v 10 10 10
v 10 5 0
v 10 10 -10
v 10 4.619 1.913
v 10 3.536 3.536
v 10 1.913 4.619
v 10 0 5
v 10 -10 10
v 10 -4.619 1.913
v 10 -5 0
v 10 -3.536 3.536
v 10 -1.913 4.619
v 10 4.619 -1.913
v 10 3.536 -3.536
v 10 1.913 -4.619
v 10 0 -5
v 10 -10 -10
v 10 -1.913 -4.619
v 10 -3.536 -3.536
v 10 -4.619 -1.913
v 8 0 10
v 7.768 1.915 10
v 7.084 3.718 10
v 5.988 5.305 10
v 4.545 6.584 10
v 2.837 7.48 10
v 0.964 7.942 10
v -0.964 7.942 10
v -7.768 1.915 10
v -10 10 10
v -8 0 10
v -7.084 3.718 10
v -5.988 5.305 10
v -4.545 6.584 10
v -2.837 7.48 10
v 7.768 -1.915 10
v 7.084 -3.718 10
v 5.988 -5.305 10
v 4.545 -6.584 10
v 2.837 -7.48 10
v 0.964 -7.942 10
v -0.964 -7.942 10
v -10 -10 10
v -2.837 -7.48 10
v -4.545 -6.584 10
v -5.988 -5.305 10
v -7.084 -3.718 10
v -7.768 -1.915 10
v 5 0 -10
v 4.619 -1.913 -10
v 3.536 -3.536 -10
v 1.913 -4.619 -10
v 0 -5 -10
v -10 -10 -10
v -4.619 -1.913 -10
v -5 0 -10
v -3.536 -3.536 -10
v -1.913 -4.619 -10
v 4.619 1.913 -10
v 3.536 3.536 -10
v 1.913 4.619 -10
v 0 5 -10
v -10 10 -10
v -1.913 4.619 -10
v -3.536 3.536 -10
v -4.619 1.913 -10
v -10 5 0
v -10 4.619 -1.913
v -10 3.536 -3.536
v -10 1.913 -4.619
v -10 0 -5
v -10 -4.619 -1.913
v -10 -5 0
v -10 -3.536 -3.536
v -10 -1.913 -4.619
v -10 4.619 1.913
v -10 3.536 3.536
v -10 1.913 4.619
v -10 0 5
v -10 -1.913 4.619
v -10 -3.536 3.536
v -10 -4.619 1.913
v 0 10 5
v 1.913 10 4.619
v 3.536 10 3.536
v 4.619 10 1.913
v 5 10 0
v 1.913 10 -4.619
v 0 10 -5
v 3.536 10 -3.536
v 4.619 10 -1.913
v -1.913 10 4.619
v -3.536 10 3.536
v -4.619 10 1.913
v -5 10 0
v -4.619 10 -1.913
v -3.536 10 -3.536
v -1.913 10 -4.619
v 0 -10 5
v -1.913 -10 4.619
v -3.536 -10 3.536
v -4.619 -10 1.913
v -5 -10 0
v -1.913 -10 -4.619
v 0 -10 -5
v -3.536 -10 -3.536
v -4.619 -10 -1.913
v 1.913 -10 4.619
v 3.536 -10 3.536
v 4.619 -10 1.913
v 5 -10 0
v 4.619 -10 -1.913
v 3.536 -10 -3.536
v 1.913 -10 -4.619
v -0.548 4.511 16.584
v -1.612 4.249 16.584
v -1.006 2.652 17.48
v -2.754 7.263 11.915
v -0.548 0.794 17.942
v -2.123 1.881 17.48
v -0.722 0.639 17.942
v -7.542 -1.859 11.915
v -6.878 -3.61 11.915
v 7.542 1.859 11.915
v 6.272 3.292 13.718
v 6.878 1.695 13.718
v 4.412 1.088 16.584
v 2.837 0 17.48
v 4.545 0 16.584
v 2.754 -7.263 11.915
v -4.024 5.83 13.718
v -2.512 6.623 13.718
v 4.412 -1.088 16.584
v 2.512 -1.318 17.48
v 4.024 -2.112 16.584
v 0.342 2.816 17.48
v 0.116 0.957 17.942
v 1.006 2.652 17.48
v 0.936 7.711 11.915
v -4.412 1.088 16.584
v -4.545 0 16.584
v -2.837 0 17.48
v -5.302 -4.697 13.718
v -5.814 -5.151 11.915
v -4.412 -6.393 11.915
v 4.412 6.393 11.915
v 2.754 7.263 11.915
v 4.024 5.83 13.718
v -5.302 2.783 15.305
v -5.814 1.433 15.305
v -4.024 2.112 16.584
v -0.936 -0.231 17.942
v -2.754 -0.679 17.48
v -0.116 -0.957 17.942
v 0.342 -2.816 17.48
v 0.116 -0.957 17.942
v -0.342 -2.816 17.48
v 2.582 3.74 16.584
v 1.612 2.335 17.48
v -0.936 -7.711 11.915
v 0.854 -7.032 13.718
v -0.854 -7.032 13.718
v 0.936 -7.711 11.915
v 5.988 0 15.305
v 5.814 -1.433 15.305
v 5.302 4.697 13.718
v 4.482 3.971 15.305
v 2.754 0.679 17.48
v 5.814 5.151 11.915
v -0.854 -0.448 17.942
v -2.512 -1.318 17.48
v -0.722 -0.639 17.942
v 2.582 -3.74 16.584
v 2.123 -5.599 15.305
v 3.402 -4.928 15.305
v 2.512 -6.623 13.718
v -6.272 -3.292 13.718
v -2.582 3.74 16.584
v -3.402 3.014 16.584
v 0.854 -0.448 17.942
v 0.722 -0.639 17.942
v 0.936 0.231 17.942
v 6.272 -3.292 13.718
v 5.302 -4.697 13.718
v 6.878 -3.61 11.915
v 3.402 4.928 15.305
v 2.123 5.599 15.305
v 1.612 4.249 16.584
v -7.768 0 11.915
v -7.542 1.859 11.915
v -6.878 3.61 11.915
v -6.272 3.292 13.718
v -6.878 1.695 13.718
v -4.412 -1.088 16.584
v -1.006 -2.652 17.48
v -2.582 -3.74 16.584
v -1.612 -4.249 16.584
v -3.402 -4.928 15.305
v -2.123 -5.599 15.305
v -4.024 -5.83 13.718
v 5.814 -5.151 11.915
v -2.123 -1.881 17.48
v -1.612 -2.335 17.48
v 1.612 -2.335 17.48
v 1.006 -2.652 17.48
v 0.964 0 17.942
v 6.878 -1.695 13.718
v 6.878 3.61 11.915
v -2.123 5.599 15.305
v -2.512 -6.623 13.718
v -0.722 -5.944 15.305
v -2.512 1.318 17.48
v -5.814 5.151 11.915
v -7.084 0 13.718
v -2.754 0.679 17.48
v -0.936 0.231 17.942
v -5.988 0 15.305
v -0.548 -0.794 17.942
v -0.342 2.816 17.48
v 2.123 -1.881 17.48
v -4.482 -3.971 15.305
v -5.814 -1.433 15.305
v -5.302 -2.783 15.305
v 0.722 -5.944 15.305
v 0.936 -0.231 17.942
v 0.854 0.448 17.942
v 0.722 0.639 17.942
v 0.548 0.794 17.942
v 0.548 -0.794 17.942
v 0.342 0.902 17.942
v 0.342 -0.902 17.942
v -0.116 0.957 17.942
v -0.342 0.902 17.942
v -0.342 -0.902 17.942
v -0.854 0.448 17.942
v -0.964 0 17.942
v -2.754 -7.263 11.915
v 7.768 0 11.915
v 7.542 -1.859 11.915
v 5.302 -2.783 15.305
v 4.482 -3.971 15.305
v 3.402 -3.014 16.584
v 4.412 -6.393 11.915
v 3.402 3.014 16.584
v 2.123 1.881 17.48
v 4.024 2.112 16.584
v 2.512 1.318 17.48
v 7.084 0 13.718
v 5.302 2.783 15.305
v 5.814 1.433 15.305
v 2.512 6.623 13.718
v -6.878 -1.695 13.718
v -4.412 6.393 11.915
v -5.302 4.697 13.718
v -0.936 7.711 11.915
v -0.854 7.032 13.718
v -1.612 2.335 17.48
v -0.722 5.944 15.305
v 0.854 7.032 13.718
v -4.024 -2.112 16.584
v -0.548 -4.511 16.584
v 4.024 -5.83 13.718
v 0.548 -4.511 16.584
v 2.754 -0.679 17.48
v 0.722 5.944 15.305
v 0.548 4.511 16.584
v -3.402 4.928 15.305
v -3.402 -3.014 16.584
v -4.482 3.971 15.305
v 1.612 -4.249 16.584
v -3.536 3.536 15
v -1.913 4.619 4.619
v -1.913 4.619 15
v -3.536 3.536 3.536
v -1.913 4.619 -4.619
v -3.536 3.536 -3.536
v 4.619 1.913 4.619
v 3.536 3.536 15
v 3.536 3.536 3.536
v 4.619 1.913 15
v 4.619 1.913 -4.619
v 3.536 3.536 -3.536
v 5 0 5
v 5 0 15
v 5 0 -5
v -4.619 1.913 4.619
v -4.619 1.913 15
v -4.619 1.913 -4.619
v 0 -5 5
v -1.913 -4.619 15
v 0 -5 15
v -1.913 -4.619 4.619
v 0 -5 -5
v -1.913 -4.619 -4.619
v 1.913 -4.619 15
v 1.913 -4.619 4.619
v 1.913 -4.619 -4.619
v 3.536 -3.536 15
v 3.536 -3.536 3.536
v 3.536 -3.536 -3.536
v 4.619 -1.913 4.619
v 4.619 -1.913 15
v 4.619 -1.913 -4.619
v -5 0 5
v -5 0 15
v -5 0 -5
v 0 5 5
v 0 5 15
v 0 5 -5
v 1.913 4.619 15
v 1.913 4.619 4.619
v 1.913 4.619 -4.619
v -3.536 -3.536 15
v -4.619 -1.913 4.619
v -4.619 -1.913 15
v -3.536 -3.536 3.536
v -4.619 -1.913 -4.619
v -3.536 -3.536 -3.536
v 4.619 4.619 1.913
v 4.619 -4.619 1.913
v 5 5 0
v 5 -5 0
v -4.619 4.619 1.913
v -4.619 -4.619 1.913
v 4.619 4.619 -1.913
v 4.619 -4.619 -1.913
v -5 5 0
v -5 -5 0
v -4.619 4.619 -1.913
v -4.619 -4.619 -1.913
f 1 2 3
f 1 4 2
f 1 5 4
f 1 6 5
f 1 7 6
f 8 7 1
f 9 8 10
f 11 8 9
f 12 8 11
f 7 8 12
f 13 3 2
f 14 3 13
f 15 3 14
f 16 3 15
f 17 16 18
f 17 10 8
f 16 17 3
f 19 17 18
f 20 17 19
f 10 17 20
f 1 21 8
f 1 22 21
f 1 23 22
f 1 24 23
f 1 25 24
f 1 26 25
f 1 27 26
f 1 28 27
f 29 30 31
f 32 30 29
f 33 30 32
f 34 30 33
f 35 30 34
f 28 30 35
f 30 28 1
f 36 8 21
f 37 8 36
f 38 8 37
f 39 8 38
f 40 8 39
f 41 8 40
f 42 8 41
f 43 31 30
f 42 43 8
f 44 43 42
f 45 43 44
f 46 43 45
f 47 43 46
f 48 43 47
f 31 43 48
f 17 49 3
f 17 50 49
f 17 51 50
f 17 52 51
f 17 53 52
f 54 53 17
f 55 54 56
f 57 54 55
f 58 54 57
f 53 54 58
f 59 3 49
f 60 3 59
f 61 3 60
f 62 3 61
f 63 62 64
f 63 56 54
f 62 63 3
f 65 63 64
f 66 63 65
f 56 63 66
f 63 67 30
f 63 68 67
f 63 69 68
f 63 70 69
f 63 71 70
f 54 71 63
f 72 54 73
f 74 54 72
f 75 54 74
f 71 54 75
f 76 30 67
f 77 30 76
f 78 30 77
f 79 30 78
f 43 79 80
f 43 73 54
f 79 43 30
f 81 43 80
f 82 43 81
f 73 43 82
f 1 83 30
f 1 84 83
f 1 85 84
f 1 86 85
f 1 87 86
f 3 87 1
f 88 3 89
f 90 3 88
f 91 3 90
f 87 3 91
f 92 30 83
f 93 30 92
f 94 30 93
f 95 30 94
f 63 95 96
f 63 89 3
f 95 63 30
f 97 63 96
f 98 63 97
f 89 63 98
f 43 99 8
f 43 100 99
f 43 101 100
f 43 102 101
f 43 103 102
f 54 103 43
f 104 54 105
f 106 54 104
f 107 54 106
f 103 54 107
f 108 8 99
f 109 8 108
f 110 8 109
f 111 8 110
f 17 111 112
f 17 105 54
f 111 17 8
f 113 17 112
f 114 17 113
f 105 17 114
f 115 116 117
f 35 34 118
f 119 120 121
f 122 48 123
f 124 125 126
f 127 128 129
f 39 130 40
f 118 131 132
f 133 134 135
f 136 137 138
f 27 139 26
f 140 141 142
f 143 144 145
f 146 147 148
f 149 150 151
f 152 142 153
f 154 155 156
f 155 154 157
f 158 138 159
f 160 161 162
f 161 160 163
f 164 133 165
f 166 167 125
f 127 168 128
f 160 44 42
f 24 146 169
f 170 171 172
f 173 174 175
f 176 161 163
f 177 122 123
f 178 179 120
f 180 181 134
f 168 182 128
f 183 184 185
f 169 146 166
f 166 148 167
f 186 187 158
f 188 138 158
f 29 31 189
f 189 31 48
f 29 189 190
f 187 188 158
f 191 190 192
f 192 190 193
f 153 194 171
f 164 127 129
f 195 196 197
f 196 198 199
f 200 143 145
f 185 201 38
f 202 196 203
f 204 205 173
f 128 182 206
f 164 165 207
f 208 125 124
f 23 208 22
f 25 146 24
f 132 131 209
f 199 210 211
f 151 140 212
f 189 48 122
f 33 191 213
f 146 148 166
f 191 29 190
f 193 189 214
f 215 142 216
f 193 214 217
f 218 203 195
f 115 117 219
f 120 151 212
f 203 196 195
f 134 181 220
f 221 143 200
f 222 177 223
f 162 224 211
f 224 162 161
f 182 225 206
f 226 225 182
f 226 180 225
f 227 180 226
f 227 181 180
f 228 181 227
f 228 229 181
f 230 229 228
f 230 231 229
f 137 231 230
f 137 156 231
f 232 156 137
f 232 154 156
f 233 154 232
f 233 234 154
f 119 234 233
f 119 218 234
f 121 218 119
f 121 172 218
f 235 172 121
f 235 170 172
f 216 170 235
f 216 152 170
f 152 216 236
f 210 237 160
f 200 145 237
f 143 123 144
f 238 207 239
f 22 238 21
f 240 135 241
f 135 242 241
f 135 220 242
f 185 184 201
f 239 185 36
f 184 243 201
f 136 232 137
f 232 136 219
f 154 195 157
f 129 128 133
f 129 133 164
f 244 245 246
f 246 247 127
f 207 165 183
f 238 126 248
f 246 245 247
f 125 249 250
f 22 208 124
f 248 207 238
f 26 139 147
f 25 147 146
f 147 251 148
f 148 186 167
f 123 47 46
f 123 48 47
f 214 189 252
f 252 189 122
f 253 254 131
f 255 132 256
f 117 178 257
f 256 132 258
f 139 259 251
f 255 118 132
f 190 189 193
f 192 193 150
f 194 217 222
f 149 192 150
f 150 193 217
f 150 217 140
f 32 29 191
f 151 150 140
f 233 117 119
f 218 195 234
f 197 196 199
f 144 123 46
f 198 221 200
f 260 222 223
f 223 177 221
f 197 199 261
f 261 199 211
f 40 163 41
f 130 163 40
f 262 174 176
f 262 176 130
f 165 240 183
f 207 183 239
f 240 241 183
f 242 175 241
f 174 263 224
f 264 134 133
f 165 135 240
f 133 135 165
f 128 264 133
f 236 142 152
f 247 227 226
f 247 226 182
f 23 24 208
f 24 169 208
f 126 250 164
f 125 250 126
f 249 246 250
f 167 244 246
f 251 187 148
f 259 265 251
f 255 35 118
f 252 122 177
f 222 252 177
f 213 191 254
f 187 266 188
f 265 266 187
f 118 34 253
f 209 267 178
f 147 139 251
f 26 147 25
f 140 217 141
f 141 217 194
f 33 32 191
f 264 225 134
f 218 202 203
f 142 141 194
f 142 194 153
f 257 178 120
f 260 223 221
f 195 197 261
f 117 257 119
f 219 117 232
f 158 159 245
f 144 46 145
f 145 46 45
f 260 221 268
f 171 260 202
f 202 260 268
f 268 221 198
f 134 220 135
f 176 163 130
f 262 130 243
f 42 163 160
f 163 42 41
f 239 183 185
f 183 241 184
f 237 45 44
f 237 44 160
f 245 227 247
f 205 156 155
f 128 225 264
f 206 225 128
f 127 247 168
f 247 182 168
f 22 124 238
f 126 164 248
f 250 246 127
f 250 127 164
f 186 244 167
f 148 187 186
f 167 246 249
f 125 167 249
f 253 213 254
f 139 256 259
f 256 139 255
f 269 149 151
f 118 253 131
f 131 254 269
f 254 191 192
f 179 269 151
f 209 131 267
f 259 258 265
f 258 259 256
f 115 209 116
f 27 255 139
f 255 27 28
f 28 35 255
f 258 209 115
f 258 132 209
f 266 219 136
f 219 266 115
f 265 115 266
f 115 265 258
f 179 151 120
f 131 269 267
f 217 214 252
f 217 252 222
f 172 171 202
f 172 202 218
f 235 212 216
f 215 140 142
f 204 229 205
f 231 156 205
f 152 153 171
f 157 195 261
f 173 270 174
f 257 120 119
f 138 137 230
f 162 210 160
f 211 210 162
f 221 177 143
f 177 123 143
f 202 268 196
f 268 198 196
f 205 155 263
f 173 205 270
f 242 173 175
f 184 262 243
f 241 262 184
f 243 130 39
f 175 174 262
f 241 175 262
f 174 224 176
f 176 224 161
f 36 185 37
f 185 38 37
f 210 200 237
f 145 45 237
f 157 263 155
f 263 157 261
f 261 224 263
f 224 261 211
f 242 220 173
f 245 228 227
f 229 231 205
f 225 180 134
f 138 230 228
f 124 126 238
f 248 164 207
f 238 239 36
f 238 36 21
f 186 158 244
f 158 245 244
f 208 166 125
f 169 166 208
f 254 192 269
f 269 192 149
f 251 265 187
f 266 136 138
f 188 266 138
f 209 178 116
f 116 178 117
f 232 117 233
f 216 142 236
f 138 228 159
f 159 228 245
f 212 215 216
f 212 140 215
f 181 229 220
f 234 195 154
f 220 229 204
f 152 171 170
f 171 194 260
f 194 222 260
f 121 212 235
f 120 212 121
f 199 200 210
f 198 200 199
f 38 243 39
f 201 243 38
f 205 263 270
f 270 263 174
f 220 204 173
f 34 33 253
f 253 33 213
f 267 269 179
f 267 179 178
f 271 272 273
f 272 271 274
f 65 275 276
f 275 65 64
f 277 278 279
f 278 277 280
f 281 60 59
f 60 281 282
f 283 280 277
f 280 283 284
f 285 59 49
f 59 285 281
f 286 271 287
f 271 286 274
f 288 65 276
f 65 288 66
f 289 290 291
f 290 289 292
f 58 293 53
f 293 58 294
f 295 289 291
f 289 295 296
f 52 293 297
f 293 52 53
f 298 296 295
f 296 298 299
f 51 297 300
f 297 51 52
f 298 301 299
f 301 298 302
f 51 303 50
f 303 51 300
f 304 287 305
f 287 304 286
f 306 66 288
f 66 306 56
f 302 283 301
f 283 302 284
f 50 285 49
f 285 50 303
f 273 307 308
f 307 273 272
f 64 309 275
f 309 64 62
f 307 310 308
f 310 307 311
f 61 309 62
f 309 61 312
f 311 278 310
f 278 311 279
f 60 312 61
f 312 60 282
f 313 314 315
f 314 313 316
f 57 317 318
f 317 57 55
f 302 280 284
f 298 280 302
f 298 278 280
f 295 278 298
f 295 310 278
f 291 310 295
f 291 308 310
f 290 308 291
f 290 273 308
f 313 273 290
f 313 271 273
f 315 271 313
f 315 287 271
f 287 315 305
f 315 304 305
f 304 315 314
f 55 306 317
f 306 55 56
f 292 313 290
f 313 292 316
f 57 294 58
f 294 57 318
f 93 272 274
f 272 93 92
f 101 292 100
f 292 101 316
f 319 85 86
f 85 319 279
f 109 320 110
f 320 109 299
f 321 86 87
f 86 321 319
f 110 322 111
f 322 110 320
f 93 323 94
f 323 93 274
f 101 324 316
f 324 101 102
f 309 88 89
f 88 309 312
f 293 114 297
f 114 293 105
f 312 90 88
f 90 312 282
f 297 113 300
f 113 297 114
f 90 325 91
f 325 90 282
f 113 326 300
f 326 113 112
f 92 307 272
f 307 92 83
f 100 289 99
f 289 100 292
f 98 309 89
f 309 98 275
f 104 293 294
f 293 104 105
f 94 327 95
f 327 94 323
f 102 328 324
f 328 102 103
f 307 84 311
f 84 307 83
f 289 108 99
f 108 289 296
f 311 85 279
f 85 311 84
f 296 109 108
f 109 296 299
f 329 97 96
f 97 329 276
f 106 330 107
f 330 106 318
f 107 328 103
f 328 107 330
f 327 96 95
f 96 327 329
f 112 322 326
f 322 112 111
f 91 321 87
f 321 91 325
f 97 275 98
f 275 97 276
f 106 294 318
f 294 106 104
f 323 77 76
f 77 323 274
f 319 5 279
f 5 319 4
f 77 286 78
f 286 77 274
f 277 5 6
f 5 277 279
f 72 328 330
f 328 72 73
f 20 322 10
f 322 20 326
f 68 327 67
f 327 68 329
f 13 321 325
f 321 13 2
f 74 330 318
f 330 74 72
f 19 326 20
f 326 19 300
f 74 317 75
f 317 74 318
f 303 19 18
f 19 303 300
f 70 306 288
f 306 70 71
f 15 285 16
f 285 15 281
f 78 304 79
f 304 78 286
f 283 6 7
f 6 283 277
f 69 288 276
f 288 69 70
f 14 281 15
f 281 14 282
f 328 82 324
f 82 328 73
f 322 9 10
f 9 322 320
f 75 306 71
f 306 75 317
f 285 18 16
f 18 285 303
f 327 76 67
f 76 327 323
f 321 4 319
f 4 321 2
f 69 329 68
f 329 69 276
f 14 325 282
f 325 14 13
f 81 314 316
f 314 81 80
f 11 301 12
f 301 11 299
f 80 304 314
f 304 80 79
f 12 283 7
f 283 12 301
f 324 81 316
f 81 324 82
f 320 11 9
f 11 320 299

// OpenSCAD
// Complex CSG operations
difference() {
  union() {
    cube([20, 20, 20], center=true);
    translate([0, 0, 10]) sphere(r=8);
  }
  cylinder(h=30, r=5, center=true);
  rotate([90, 0, 0]) cylinder(h=30, r=5, center=true);
  rotate([0, 90, 0]) cylinder(h=30, r=5, center=true);
}
